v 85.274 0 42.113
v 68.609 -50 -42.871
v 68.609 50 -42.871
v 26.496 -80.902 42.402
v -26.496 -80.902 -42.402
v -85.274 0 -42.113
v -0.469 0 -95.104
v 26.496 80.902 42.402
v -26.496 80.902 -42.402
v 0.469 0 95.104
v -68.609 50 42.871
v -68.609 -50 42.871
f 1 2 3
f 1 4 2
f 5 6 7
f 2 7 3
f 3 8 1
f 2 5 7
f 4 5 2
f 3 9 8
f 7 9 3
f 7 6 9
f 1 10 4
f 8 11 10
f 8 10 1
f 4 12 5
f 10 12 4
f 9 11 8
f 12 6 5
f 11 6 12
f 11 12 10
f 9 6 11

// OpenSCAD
/*****************************************************************
* Twenty Sided Die box, based on the model:
*************************************************************/

/*****************************************************************
* Icosahedron   By Adam Anderson
* 
* This module allows for the creation of an icosahedron scaled up 
* by a factor determined by the module parameter. 
* The coordinates for the vertices were taken from
* http://www.sacred-geometry.es/?q=en/content/phi-sacred-solids
*************************************************************/


module icosahedron(a = 2) {
    phi = a * ((1 + sqrt(5)) / 2);
    polyhedron(
        points = [
            [0,-phi, a], [0, phi, a], [0, phi, -a], [0, -phi, -a], [a, 0, phi], [-a, 0, phi], [-a, 0, -phi], 
            [a, 0, -phi], [phi, a, 0], [-phi, a, 0], [-phi, -a, 0], [phi, -a, 0]    
        ],
        faces = [
            [0,5,4], [0,4,11], [11,4,8], [11,8,7], [4,5,1], [4,1,8], [8,1,2], [8,2,7], [1,5,9], [1,9,2], [2,9,6], [2,6,7], [9,5,10], [9,10,6], [6,10,3], [6,3,7], [10,5,0], [10,0,3], [3,0,11], [3,11,7]
        ]
    
    );
}

module top_icosahedron(a = 2) {
    intersection() {
        rotate([0, 32, 0]) icosahedron(a);
        translate([0, 0, -2.85 * a])  cube(4 * a, center = true);
    }
}

module bottom_icosahedron(a = 2) {
    
    intersection() {
        rotate([0, 32, 0]) icosahedron(a);
        translate([0, 0, 1.15 * a])  cube(4 * a, center = true);
    }
    
}


top_icosahedron(50);
bottom_icosahedron(50);
